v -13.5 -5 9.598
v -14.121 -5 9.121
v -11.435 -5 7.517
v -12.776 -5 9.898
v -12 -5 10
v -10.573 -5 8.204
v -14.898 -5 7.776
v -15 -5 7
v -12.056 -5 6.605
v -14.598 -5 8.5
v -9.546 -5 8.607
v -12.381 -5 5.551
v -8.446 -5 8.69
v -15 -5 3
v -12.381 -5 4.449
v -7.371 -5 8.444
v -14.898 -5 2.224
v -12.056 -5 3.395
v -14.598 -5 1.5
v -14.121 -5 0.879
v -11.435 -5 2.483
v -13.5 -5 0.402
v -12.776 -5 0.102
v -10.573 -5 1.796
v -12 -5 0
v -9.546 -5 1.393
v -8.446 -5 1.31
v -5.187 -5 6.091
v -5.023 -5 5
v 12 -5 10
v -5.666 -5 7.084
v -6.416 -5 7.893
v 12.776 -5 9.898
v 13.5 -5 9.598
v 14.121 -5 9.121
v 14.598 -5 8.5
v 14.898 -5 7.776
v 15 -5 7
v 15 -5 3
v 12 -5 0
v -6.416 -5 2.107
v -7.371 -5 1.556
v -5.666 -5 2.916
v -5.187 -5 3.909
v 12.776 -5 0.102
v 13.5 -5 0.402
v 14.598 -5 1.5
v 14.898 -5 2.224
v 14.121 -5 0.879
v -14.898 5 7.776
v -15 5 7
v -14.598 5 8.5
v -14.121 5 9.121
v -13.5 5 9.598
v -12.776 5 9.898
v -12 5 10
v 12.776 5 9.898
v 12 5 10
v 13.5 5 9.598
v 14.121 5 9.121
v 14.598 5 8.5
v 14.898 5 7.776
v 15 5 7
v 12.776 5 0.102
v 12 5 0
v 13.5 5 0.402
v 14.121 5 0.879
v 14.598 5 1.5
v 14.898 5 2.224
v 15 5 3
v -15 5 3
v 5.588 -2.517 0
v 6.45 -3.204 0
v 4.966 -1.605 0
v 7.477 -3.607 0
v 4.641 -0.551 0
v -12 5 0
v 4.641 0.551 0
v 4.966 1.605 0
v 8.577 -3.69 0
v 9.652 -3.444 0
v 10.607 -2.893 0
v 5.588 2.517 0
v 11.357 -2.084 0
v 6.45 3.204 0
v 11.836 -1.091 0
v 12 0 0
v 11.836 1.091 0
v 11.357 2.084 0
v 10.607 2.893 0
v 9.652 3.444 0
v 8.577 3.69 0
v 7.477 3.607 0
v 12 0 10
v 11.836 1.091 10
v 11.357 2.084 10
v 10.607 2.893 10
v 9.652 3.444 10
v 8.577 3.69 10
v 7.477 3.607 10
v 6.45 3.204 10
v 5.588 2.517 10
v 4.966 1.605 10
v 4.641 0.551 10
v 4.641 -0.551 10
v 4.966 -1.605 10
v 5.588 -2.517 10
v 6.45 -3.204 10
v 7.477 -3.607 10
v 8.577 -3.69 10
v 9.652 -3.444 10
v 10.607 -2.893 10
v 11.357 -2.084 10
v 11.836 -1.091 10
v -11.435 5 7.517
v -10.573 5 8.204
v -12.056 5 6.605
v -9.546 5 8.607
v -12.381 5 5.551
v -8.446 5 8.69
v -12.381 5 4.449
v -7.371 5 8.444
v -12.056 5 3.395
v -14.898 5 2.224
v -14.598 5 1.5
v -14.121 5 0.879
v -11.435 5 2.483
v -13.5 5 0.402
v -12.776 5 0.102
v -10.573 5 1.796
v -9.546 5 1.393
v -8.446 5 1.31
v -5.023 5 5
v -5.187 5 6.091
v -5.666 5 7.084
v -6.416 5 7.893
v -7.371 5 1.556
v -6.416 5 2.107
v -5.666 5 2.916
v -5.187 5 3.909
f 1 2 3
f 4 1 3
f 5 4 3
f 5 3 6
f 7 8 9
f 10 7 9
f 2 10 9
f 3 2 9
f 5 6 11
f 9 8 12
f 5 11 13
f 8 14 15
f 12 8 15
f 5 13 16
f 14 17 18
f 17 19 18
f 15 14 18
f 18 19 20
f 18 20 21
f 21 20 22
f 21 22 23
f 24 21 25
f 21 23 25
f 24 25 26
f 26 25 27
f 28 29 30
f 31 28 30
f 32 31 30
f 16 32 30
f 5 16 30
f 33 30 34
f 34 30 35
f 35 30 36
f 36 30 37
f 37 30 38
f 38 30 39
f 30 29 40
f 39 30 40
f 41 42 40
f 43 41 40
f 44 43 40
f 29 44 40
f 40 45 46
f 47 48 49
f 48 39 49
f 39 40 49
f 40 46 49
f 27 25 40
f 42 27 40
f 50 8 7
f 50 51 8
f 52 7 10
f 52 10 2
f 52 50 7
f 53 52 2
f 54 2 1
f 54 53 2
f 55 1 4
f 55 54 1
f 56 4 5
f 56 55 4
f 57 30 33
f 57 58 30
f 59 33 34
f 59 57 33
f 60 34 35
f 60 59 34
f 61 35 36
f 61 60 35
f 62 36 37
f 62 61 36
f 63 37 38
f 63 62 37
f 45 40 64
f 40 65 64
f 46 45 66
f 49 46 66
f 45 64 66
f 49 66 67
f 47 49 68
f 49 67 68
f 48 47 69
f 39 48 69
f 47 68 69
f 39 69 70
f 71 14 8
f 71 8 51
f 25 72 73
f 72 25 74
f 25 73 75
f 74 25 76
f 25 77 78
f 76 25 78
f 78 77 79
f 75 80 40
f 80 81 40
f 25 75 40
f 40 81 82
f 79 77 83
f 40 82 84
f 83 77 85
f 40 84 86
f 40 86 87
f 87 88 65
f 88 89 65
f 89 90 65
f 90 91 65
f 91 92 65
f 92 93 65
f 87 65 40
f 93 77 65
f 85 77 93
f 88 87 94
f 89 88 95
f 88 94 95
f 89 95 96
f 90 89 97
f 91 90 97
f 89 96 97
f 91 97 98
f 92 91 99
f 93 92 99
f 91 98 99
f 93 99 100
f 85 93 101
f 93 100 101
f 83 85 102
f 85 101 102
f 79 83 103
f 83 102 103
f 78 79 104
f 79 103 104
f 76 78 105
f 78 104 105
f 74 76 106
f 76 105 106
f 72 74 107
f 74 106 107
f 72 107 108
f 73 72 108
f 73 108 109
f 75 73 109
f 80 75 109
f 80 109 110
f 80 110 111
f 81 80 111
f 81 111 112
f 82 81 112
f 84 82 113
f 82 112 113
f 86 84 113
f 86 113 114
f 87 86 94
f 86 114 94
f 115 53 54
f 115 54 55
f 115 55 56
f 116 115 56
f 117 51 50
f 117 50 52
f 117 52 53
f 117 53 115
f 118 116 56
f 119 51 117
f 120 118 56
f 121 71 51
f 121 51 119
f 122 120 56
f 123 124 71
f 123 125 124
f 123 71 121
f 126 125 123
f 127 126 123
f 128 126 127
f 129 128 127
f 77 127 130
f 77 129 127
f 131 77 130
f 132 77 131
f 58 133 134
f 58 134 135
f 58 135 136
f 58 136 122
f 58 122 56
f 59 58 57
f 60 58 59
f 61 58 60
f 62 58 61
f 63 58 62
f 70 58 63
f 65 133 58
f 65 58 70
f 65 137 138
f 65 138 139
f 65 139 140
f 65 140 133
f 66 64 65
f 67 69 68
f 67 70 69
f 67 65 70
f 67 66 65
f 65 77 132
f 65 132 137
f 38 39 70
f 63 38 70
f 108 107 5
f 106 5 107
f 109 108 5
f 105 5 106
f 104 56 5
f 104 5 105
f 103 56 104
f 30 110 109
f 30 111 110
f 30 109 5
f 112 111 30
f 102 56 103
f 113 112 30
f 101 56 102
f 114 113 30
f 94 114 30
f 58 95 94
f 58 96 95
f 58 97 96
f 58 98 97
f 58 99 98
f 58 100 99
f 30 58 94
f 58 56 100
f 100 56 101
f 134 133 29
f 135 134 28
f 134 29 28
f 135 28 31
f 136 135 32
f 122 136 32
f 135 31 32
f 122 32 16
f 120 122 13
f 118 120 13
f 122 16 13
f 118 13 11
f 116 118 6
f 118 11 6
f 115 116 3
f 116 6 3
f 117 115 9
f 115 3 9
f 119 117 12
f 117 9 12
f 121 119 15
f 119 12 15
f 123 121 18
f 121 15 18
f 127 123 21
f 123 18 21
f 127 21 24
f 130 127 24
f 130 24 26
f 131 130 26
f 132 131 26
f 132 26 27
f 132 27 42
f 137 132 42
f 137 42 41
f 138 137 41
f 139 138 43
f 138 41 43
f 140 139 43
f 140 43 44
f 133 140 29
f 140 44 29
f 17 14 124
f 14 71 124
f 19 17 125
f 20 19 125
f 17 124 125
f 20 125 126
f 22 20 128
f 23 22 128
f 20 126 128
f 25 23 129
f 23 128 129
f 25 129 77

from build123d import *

# Parameters (mm, degrees)
F0_W     = 30
F0_H     = 10
F1_DEPTH = 10
F2_R     = 3.7
F3_DEPTH = 10
F4_R     = 3.7
F5_DEPTH = 10
F6_R     = 2.99999


# Not quite as in the source:
# - a fillet or chamfer is up to 0.001 mm smaller than in the source, because OpenCascade refuses the exact size


with BuildPart() as f1:
    # F0 (on Top) → F1 (new body)
    with BuildSketch(Plane.XY):
        Rectangle(F0_W, F0_H)
    extrude(amount=F1_DEPTH)

    # F2 (on face) → F3 (cut, through all)
    with BuildSketch(Plane.XY.offset(10)):
        with Locations((8.3, 0)):
            Circle(F2_R)
    extrude(amount=-F3_DEPTH, mode=Mode.SUBTRACT)

    # F4 (on face) → F5 (cut, through all)
    with BuildSketch(Plane.XZ.offset(5)):
        with Locations((-8.7227521392, 5)):
            Circle(F4_R)
    extrude(amount=-F5_DEPTH, mode=Mode.SUBTRACT)

    # F6 (radius 3 in the source; OpenCascade refuses exactly that, so slightly less here)
    f6_edges = [f1.edges().sort_by_distance(p)[0] for p in [
        (-15, 0, 10),
        (15, 0, 10),
        (15, 0, 0),
        (-15, 0, 0),
    ]]
    fillet(f6_edges, radius=F6_R)


solid = f1.part
